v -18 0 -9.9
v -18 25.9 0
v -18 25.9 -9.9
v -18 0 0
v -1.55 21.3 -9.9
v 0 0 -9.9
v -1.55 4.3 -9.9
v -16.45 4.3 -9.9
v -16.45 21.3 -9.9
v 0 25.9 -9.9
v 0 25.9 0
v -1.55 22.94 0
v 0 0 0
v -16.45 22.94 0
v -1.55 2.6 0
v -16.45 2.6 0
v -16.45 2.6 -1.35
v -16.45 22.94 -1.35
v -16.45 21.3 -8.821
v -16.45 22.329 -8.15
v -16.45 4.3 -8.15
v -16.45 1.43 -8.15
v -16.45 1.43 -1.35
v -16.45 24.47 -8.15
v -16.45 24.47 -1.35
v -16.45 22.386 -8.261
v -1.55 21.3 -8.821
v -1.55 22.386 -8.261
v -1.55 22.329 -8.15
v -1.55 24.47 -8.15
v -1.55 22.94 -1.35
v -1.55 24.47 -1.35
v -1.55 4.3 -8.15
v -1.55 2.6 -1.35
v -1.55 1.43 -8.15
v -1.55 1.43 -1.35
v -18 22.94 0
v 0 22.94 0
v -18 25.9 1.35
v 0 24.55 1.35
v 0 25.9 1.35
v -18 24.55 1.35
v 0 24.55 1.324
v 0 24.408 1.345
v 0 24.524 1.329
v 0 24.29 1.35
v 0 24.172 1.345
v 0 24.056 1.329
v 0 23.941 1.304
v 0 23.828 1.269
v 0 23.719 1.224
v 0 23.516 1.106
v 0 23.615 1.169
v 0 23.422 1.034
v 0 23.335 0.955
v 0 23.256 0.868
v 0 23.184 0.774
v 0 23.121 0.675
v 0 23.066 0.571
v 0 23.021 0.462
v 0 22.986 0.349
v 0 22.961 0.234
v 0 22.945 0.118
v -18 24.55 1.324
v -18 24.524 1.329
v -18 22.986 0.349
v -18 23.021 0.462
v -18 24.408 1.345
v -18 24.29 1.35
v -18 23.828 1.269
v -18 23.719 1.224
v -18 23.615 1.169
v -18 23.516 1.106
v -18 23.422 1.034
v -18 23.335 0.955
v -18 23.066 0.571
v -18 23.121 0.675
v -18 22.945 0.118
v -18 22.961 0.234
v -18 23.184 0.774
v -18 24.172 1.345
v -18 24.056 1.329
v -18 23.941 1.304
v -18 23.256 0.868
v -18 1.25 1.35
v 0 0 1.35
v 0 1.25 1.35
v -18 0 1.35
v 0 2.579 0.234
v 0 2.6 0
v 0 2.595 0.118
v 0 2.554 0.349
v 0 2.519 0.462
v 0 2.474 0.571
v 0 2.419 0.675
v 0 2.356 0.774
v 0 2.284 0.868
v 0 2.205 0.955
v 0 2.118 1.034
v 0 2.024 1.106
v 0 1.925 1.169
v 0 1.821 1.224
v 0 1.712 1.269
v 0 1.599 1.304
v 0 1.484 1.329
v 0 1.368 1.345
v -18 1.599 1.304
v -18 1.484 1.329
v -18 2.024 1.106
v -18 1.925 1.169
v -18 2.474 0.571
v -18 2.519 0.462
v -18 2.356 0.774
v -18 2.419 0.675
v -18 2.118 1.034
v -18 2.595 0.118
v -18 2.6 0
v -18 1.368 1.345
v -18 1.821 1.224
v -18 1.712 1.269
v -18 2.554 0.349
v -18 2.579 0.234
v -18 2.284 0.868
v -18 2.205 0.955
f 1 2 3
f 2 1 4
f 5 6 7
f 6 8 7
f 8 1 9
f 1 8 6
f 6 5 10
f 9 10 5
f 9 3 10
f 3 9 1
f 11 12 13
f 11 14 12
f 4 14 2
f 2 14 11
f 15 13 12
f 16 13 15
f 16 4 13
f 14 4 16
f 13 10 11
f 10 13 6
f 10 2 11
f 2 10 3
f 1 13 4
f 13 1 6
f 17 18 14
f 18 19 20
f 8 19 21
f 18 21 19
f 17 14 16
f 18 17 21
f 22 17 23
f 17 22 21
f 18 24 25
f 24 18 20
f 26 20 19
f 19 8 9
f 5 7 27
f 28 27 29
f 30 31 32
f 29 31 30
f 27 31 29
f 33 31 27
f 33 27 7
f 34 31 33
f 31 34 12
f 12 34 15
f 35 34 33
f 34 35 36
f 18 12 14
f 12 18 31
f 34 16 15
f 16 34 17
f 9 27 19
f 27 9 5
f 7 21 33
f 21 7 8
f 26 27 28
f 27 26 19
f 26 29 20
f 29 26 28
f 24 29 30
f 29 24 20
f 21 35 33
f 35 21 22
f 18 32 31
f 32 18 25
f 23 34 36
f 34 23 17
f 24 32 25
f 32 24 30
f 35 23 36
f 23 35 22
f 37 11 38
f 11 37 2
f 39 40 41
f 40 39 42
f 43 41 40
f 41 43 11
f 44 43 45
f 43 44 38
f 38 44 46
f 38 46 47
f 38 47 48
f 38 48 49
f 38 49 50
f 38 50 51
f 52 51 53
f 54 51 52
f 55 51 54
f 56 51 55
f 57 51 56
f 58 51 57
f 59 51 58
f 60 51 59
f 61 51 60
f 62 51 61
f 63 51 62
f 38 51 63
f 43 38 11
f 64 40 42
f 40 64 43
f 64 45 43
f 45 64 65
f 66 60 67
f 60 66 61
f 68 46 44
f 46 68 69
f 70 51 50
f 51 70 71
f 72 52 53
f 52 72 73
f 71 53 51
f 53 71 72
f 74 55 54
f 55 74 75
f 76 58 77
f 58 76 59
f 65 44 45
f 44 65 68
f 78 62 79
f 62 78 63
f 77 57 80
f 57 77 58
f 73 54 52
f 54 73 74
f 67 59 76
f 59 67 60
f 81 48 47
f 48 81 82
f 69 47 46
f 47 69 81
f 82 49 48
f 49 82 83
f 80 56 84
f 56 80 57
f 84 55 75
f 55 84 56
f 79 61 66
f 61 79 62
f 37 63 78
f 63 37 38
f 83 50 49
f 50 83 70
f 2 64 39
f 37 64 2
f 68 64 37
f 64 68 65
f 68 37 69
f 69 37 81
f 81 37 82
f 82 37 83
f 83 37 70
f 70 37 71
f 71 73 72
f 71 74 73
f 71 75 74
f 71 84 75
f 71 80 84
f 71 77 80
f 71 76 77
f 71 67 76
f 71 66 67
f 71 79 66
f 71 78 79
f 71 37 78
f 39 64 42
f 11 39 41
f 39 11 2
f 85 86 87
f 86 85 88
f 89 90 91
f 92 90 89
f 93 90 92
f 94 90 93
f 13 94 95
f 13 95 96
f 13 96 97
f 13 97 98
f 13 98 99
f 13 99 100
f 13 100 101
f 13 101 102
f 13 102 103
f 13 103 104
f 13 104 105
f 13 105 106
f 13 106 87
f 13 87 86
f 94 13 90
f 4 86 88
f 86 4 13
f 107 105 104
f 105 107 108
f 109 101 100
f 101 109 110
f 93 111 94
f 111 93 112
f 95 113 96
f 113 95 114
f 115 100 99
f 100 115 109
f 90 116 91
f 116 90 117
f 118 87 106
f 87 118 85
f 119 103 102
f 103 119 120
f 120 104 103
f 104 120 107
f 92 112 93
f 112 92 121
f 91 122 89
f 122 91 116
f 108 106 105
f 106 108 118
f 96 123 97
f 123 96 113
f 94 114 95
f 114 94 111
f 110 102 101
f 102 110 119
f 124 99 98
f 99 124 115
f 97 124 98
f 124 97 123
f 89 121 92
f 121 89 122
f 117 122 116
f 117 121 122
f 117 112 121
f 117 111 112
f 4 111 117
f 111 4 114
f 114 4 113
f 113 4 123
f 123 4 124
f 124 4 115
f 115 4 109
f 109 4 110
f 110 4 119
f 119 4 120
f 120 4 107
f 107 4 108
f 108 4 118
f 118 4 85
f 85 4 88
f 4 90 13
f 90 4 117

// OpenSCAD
$fa = 5;
$fs = 0.01;

/*
 * The RJ45 keystone receiver
 */
// adjustments to original
clip_adjustment =0.9;   // some keystone jacks fit too tight so we add a little here
exterior_slot_adjustment = 3.4; // original 2.6

// the following have not been changed
outside_width=18;
outside_height=25 + clip_adjustment;
outside_depth=9.9;
outside_wall = 1.55;
inside_width = outside_width-(outside_wall*2);
inside_height= outside_height-5.56; //19.44;
inside_cutout_height = outside_height - 2.86;
inside_cutout_depth = outside_depth - 3.1;
exterior_slot = 7.9;
exterior_notch_height = 17.0;
exterior_notch_depth = outside_depth - 2.7;
exterior_slot_height = outside_height - 8.75;
top_clip_bar = outside_height - 2.96 ;

module rj45Receiver()
{
    difference() {
        cube([outside_width, outside_height, outside_depth]);
        translate([outside_wall, 2.6, -0.001]) {
            cube([inside_width, inside_height, exterior_slot]);
        }
        // exterior slot
        translate([outside_wall, exterior_slot_adjustment+clip_adjustment,
                exterior_slot]) {
            cube([inside_width, exterior_notch_height, 2.001]);
        }
        // exterior_notch
        translate([outside_wall, exterior_notch_height+clip_adjustment,
                exterior_notch_depth]) {
            rotate(v=[1, 0, 0], a=-27.3) 
                cube([inside_width, 3.5, 3]);
        }
        // interior cutout
        translate([outside_wall, 1.43, 1.35]) {
            cube([inside_width, inside_cutout_height, inside_cutout_depth]);
        }
    }
    // top clip bar
    translate([0, top_clip_bar, -1.35]) {
        intersection() {
            cube([outside_width, 2.96, 1.35]);
            union() {
                translate([0, 1.61, 0]) {
                    cube([20.42, 1.61, 1.35]);
                }
                translate([0, 1.35, 1.35]) {
                    rotate(v=[0, 1, 0], a=90) {
                        cylinder(h=20.42, r=1.35);
                    }
                }
            }
        }
    }
    // bottom clip bar
    translate([0, 0, -1.35]) {
        intersection() {
            cube([outside_width, outside_wall*2, 1.35]);
            union() {
                cube([20.42, 1.25, 1.35]);
                translate([0, 1.25, 1.35]) {
                    rotate(v=[0, 1, 0], a=90) {
                        cylinder(h=20.42, r=1.35);
                    }
                }
            }
        }
    }
}

// these are sometimes needed when fitting the jacks into projects
function rj45_width() = outside_width;
function rj45_height() = outside_height;
function rj45_depth() = outside_depth;

 // So a hole can be cut for the keystone socket
module rj45VolumeBlock() {
    cube([outside_width, outside_height, outside_depth]);
}

rotate([0,180,0]) 
    rj45Receiver();
